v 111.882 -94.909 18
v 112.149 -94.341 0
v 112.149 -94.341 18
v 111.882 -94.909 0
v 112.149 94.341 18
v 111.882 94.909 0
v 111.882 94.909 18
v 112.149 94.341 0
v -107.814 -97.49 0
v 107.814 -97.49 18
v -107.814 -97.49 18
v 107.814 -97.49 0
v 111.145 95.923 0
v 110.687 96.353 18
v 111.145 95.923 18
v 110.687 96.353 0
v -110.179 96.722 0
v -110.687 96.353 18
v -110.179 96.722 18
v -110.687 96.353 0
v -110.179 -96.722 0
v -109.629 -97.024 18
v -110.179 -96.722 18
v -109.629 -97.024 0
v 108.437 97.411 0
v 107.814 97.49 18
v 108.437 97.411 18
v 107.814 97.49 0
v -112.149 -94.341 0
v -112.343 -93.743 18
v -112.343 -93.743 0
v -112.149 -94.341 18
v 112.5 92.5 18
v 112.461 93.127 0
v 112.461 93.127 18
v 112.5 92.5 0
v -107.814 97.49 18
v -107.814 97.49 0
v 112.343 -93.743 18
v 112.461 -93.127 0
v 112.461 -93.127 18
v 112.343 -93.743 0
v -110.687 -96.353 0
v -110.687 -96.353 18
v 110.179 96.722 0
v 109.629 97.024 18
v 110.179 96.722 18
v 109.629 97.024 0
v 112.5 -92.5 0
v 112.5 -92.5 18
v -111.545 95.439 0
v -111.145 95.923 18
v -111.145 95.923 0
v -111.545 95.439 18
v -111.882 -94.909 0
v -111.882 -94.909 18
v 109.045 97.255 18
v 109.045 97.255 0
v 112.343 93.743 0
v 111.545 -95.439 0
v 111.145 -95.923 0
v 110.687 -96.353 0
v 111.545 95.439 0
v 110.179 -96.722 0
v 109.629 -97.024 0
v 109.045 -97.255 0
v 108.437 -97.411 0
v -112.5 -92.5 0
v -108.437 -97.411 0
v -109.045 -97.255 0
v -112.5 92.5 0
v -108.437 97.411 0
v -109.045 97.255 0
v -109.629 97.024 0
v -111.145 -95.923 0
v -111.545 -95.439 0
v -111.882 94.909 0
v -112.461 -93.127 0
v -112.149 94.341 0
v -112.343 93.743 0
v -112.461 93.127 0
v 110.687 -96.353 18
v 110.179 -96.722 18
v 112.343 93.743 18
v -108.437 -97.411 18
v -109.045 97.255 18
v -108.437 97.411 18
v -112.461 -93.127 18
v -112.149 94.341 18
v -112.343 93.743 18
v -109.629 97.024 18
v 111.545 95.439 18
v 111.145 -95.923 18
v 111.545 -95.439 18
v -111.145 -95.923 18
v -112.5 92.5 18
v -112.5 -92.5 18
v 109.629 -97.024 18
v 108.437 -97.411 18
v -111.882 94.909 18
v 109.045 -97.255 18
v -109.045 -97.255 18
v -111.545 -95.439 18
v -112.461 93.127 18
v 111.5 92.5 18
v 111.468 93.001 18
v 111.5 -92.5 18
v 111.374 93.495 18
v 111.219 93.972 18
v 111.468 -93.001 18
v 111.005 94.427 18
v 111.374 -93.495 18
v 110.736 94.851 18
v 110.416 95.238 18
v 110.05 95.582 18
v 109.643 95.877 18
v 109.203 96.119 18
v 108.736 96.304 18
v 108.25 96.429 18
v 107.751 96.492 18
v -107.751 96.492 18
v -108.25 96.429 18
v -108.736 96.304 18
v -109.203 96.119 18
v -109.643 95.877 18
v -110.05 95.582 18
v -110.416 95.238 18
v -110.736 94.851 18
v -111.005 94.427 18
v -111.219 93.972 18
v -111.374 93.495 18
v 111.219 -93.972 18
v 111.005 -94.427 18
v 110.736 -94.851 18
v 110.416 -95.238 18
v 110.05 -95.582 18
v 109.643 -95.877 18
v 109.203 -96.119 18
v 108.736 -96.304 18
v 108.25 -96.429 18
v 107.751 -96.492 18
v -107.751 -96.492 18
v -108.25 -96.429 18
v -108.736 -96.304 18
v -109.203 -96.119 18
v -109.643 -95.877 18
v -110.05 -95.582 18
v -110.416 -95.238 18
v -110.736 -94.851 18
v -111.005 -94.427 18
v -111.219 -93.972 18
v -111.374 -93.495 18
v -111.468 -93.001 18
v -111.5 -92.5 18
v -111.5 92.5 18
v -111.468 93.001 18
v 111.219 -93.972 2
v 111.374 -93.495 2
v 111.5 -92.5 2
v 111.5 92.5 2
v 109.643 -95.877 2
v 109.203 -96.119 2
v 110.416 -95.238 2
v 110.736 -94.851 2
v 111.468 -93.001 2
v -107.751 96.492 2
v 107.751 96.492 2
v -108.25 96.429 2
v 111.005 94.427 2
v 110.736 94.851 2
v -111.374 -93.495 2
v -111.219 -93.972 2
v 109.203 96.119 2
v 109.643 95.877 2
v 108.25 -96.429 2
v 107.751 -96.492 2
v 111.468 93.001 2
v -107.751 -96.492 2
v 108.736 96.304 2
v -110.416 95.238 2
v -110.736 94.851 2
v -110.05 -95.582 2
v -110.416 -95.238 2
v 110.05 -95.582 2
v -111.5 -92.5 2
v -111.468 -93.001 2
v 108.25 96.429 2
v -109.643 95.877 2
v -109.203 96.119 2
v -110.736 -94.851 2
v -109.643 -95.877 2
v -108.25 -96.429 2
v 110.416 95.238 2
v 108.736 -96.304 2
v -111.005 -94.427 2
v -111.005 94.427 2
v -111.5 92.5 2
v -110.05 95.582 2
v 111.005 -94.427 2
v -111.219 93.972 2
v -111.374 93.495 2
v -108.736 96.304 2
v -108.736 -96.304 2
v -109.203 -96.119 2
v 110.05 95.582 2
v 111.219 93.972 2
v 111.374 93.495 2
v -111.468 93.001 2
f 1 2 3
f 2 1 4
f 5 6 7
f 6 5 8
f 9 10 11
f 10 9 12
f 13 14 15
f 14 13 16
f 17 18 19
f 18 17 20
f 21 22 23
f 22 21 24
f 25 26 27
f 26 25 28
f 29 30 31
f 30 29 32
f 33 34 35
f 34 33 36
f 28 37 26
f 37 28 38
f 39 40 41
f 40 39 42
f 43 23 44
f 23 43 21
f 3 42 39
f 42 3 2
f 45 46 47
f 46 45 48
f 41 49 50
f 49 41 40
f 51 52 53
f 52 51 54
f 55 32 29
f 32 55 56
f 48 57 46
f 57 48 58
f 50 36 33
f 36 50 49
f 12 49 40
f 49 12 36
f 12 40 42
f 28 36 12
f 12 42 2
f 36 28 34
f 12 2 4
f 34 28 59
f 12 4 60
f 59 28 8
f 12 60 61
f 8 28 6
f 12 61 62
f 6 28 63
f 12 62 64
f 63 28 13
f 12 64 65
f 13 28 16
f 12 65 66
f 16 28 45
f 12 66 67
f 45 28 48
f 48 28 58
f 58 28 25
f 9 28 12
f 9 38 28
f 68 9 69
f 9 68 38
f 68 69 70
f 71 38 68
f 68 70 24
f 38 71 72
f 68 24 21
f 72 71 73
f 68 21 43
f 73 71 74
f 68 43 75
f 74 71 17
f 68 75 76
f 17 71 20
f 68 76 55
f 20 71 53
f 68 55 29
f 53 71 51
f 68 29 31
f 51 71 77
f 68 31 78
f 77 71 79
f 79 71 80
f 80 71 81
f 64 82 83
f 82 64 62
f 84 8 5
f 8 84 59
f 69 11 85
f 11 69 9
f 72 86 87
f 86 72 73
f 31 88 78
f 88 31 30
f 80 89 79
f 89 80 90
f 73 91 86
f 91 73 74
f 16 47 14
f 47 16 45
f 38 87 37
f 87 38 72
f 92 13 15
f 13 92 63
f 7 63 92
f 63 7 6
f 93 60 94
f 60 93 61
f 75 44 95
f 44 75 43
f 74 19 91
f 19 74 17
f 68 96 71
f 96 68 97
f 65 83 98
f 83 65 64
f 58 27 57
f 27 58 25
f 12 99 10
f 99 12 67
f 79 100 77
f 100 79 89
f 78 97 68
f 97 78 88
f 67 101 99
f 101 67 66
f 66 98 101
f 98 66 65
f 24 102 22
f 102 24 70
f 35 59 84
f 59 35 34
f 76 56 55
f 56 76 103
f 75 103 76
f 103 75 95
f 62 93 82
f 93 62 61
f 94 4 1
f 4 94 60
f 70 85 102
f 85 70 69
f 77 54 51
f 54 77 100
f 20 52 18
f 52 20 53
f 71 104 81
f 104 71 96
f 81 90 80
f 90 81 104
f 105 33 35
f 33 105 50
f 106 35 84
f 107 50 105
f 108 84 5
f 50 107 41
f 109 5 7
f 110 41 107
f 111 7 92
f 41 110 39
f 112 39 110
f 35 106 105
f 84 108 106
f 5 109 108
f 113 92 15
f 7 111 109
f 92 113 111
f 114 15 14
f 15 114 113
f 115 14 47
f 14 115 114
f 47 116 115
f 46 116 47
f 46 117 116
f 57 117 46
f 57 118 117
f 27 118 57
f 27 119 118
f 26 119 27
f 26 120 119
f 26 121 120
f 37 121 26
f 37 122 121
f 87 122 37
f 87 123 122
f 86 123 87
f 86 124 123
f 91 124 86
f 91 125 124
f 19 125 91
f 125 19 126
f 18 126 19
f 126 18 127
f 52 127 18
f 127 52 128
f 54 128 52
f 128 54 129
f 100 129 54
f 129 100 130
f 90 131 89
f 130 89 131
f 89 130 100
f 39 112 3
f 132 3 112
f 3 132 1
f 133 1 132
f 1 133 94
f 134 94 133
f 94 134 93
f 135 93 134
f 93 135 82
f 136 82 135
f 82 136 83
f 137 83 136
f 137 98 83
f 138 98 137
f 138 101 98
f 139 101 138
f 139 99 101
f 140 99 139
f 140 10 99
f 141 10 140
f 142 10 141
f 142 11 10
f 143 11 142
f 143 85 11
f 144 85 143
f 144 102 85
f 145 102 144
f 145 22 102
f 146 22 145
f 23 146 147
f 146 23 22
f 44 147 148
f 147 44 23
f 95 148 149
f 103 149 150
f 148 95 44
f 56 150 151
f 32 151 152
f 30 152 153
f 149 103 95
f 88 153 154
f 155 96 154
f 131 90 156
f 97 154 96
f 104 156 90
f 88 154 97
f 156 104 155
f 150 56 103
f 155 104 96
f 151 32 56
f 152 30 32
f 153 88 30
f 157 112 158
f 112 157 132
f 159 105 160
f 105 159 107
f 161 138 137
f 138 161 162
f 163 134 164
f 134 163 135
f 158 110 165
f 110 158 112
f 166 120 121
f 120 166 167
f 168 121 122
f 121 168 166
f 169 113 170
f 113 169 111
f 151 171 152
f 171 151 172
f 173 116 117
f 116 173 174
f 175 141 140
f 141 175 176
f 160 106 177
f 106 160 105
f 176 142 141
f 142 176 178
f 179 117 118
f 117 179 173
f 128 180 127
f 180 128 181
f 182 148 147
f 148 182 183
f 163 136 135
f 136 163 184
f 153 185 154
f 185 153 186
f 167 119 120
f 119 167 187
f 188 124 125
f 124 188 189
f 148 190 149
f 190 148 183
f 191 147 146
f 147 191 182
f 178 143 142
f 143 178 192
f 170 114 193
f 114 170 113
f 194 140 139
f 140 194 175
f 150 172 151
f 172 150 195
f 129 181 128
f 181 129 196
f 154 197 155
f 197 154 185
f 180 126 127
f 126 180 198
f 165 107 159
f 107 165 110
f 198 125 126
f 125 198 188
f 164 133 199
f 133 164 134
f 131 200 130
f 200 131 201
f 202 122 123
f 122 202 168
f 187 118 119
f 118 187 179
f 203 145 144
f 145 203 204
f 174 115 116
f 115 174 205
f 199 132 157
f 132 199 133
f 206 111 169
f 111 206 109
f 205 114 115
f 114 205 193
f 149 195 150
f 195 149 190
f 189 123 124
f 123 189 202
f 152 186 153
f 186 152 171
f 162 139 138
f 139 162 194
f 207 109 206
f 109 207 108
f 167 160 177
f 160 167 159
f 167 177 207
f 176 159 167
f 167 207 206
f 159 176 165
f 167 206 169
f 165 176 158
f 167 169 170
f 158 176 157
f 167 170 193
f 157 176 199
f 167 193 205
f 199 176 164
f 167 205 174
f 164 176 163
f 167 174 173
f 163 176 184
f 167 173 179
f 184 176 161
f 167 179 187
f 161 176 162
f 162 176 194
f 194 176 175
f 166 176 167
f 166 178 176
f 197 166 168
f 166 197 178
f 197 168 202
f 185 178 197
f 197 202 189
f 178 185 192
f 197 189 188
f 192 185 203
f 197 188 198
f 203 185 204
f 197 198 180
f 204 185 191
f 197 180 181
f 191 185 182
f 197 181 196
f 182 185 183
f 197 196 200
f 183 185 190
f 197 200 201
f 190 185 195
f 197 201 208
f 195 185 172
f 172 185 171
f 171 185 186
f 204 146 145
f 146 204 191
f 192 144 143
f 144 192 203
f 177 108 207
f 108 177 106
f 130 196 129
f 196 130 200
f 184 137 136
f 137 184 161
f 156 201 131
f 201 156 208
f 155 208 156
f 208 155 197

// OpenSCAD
$fn = 50;


difference() {
	union() {
		hull() {
			translate(v = [-107.5000000000, 92.5000000000, 0]) {
				cylinder(h = 18, r = 5);
			}
			translate(v = [107.5000000000, 92.5000000000, 0]) {
				cylinder(h = 18, r = 5);
			}
			translate(v = [-107.5000000000, -92.5000000000, 0]) {
				cylinder(h = 18, r = 5);
			}
			translate(v = [107.5000000000, -92.5000000000, 0]) {
				cylinder(h = 18, r = 5);
			}
		}
	}
	union() {
		translate(v = [0, 0, 2]) {
			hull() {
				translate(v = [-107.5000000000, 92.5000000000, 0]) {
					cylinder(h = 16, r = 4);
				}
				translate(v = [107.5000000000, 92.5000000000, 0]) {
					cylinder(h = 16, r = 4);
				}
				translate(v = [-107.5000000000, -92.5000000000, 0]) {
					cylinder(h = 16, r = 4);
				}
				translate(v = [107.5000000000, -92.5000000000, 0]) {
					cylinder(h = 16, r = 4);
				}
			}
		}
	}
}
